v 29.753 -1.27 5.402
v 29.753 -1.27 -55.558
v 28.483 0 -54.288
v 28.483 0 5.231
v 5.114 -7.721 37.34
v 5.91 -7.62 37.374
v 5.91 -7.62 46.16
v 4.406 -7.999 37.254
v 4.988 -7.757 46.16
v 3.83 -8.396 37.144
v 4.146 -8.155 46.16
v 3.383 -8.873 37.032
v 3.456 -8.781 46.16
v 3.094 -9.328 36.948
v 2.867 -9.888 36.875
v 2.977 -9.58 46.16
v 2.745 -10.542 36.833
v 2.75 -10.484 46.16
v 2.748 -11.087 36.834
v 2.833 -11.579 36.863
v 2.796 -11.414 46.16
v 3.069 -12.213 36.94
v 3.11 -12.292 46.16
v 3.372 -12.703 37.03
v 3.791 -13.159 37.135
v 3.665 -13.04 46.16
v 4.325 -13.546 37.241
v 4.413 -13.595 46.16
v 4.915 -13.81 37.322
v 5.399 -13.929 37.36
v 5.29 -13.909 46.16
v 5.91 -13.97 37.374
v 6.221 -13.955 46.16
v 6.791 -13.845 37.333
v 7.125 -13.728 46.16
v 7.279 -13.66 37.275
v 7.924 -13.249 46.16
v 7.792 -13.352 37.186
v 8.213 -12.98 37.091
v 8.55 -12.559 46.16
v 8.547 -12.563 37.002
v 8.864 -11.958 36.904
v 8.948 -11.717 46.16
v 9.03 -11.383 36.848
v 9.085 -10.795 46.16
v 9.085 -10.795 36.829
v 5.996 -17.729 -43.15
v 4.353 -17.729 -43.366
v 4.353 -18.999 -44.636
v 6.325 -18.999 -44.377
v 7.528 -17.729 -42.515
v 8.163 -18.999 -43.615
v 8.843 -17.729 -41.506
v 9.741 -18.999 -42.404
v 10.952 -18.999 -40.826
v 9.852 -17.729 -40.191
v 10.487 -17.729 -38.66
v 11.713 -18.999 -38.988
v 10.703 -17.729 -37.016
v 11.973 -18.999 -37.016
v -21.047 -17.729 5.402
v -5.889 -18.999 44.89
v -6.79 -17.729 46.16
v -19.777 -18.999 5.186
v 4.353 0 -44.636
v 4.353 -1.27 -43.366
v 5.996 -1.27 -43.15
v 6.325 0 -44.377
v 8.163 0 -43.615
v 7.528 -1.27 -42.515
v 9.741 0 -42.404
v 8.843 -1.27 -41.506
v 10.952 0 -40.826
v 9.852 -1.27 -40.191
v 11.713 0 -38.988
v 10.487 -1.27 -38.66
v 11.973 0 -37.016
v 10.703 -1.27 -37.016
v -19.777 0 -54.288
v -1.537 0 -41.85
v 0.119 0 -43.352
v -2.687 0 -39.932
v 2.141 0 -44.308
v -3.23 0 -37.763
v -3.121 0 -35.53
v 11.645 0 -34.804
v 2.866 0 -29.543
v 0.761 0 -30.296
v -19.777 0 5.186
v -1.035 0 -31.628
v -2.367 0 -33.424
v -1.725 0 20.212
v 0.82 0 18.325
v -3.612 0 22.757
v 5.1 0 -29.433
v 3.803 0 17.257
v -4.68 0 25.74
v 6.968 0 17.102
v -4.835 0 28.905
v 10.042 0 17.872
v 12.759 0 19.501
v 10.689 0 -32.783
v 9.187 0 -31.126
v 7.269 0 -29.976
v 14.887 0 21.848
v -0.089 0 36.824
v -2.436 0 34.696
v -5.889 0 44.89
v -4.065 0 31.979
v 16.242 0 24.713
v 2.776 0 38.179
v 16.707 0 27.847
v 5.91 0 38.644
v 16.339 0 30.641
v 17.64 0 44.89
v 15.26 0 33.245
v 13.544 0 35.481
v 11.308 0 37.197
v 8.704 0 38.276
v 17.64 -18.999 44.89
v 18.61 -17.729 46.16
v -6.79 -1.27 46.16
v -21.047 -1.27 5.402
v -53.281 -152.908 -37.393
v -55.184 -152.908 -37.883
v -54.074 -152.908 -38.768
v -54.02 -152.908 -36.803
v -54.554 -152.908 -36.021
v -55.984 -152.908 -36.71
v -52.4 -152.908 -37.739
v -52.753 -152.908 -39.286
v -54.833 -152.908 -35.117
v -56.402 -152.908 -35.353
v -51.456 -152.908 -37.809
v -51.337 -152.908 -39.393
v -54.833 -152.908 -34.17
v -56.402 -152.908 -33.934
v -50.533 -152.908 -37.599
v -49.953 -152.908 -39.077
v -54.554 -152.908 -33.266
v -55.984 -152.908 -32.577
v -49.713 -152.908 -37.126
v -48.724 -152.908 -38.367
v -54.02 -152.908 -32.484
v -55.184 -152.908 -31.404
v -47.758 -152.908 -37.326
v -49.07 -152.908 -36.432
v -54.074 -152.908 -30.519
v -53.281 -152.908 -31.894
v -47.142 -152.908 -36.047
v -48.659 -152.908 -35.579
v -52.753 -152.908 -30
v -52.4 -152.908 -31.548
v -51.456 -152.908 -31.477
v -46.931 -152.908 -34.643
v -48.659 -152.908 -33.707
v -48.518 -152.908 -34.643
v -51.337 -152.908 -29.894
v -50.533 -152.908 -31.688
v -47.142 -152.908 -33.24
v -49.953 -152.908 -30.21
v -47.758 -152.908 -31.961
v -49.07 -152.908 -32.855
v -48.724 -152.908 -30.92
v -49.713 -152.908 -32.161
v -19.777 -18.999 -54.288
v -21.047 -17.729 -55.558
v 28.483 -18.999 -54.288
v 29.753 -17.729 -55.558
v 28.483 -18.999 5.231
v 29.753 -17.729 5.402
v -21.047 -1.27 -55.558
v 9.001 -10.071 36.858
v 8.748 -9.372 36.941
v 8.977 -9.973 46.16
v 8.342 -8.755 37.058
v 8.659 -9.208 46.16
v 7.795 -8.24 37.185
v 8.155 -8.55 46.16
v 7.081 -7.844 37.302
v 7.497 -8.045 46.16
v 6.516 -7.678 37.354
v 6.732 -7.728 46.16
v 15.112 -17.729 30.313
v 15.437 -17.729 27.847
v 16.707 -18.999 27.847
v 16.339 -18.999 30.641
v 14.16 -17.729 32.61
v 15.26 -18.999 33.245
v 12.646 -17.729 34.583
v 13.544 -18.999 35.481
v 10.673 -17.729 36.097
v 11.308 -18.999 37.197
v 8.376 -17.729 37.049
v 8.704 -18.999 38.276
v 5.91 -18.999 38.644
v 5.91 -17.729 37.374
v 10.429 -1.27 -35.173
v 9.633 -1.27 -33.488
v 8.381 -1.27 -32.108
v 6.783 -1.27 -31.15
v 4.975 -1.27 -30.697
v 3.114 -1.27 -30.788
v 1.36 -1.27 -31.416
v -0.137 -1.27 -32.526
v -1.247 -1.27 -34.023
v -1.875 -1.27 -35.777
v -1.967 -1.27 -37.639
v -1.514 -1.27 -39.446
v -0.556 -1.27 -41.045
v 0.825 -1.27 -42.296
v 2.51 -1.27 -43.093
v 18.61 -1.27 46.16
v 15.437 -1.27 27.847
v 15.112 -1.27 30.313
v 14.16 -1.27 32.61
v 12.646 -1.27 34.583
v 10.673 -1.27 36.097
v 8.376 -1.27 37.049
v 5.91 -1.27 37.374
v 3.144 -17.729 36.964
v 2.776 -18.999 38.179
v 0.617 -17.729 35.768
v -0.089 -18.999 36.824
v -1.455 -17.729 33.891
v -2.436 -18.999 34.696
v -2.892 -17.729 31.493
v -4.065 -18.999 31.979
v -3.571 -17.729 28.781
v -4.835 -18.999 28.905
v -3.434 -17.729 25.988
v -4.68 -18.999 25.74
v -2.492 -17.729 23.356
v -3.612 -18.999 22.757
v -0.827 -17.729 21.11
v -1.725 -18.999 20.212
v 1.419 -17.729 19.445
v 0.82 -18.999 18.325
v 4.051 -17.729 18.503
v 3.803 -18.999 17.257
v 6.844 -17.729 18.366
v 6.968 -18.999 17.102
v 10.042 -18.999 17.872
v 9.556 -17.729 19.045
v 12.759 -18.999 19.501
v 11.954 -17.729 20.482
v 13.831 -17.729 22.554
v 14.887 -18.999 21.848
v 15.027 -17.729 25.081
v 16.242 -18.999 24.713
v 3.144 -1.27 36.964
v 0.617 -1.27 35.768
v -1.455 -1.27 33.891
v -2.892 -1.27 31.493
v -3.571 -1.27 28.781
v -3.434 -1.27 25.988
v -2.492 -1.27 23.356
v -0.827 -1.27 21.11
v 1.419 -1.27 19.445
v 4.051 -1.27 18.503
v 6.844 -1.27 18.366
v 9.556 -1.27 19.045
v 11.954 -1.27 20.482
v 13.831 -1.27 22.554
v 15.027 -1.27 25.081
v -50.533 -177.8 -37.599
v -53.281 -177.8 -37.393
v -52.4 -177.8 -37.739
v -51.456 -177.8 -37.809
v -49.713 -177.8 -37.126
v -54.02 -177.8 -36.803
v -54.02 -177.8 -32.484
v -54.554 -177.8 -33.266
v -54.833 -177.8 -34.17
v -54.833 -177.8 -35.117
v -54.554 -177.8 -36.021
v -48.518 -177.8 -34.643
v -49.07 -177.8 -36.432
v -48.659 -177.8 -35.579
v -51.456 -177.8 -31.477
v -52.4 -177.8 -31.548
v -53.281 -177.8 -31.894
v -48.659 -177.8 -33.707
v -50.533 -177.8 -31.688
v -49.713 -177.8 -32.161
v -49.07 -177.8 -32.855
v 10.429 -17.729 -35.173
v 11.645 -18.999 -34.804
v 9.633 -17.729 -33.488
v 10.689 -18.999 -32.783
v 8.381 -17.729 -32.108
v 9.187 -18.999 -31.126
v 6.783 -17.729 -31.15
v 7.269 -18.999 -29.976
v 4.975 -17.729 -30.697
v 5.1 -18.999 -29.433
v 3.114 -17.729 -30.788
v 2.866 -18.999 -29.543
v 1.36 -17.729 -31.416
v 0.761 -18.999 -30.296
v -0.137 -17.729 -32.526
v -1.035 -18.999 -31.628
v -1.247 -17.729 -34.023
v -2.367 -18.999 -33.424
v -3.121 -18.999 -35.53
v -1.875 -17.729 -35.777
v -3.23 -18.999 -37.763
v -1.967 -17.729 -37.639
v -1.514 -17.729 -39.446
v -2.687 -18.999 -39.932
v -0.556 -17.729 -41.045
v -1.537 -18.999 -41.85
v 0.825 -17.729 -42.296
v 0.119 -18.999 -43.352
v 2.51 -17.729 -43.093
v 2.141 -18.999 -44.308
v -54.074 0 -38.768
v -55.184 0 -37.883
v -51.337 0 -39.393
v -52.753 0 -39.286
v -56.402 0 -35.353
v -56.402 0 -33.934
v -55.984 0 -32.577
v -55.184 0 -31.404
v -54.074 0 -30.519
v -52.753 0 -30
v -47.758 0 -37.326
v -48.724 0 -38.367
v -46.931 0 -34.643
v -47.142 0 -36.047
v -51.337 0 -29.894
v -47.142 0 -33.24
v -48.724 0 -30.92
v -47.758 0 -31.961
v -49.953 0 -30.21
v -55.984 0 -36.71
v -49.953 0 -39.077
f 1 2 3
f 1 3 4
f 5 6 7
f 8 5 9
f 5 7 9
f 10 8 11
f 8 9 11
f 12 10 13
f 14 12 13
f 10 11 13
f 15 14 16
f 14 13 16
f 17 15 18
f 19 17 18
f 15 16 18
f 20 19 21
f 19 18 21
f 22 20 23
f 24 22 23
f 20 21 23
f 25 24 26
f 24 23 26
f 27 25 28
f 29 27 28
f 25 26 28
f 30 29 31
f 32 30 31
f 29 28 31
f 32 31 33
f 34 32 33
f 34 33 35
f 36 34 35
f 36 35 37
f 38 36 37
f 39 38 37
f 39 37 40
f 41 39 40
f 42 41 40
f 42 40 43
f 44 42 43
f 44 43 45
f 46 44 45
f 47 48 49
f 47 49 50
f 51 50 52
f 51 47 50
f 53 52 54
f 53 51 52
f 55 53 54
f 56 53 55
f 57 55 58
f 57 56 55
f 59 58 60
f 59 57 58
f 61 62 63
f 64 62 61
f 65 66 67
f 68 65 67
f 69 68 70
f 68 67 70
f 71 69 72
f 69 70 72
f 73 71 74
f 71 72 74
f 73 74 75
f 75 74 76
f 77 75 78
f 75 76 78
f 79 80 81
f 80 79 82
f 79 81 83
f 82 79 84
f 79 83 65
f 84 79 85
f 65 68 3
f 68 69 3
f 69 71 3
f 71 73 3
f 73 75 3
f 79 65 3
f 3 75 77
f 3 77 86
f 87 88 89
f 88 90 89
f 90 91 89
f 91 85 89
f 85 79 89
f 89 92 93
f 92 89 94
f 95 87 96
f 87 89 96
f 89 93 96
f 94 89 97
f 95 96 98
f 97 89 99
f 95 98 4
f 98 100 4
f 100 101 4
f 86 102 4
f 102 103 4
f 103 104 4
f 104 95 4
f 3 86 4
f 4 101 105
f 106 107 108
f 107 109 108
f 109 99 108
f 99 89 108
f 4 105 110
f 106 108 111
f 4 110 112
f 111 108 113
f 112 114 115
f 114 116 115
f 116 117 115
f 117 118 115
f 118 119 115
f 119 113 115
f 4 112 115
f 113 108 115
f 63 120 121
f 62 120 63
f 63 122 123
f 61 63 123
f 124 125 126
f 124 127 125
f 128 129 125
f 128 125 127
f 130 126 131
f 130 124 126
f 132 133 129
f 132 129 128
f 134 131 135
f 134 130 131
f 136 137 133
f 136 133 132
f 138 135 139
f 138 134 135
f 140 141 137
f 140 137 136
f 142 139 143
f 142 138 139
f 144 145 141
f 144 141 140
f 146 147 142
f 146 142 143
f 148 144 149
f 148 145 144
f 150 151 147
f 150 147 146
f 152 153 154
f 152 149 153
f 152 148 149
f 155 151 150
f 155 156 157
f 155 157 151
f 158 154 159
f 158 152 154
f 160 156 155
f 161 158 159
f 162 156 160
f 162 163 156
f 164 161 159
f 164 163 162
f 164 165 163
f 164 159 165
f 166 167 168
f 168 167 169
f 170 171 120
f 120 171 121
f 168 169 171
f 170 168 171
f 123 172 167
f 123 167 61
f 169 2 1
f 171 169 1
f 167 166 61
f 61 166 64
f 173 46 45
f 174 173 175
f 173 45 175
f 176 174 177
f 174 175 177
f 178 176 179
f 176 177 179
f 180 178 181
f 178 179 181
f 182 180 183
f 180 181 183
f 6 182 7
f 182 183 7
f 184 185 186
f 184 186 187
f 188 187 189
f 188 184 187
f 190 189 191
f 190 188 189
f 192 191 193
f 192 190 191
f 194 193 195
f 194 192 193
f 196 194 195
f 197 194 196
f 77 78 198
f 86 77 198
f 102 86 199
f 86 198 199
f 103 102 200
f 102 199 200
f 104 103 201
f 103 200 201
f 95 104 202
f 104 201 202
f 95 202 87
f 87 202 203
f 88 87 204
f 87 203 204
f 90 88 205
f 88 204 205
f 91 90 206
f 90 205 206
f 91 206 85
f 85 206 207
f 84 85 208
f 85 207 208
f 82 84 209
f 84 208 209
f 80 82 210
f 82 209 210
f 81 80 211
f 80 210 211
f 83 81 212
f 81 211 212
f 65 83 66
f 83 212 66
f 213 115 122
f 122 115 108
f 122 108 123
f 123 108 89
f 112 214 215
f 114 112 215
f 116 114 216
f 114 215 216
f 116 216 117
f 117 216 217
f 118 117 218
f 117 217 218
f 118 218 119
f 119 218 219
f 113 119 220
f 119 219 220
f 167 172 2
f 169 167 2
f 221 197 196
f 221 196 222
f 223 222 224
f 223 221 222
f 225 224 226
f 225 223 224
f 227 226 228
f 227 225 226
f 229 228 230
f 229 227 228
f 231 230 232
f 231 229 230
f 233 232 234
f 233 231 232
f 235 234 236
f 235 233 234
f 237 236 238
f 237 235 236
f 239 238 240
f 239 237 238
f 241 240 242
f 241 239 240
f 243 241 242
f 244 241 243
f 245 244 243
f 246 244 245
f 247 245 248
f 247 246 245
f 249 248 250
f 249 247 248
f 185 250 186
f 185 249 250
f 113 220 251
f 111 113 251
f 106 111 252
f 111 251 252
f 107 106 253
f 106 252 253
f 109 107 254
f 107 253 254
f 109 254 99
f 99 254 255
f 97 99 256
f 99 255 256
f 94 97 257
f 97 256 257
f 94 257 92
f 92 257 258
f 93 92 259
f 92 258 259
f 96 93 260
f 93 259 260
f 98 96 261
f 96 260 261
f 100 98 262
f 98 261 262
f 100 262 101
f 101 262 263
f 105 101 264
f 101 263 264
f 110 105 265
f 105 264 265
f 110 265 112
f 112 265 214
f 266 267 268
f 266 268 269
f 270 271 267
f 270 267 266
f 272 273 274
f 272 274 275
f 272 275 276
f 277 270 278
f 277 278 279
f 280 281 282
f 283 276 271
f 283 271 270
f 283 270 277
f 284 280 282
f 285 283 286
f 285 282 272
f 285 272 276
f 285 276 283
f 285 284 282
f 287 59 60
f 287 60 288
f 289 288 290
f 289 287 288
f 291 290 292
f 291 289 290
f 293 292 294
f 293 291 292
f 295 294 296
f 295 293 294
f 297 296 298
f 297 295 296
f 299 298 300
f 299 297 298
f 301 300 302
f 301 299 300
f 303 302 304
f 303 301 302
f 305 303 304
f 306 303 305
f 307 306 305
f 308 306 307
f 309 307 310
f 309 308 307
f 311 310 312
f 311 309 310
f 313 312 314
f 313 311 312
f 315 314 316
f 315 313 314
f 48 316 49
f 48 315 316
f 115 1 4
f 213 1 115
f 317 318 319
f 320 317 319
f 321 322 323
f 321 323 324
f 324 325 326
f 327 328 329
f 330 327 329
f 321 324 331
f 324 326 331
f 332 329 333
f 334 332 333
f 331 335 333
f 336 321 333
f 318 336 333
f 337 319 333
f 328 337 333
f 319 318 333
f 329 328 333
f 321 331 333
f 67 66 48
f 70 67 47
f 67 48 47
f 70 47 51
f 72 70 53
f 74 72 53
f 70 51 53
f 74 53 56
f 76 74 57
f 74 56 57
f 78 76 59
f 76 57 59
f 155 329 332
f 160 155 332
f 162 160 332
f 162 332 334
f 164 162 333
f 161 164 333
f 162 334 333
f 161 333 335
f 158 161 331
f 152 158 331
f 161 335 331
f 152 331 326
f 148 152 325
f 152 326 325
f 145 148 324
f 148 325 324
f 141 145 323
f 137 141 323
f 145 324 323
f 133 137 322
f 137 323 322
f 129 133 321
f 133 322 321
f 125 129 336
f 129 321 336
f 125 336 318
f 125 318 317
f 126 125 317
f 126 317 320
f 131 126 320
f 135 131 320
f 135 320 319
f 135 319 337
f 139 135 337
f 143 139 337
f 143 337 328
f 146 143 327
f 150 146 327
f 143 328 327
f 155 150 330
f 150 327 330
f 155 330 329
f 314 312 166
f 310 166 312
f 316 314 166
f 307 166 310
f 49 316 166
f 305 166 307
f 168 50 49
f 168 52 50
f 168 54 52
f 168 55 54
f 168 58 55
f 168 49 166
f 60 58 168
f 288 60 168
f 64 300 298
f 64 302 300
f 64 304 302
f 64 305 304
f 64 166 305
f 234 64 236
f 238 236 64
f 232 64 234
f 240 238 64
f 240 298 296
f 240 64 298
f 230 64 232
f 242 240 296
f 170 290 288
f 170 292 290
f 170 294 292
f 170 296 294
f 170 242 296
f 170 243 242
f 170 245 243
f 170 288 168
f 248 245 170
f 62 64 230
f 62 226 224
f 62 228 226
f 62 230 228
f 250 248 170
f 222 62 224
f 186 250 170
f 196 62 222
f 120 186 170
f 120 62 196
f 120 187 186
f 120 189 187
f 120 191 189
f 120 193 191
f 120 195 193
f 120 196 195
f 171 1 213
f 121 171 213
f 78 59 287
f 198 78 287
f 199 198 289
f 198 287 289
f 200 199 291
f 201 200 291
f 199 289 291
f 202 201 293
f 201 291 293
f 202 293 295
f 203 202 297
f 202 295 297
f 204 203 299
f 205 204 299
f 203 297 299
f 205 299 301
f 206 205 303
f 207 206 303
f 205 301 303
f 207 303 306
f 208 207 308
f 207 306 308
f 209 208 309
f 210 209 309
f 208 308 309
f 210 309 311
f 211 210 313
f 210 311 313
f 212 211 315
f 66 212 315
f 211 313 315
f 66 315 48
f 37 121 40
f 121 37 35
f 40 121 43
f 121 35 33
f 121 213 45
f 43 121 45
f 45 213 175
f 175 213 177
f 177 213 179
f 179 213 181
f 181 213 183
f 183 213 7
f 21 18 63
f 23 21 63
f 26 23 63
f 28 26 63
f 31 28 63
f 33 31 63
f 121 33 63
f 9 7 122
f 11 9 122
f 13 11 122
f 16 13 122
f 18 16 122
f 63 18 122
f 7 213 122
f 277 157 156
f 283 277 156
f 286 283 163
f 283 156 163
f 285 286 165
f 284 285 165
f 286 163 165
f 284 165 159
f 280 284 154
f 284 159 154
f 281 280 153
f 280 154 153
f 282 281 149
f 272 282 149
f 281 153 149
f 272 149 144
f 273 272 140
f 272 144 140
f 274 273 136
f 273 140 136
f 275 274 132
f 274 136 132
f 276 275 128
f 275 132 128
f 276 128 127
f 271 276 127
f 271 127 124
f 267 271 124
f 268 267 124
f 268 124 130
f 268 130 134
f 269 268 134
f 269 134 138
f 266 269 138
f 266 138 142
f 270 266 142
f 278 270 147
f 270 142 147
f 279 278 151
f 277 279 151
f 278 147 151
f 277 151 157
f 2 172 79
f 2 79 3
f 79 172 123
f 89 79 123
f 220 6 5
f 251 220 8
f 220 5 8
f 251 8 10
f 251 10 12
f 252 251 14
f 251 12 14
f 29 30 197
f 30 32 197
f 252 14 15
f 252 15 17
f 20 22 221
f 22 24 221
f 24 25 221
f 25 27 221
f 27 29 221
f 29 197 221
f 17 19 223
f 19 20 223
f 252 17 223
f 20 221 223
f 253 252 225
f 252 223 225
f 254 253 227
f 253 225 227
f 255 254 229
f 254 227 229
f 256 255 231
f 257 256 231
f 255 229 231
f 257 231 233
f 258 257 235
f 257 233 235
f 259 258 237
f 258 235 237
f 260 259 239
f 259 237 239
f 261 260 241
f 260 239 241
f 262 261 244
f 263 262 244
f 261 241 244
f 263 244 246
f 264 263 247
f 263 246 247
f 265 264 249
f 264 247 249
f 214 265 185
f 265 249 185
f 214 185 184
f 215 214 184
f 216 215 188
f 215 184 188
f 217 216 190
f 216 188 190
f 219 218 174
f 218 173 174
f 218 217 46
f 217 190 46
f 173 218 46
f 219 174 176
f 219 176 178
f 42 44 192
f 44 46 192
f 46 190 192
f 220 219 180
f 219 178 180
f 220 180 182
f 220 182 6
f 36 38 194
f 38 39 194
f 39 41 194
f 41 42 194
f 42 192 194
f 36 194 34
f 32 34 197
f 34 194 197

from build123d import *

# Parameters (mm, degrees)
F0_W      = 50.8
F0_H      = 60.96
F1_DEPTH  = 18.9992
F3_DEPTH  = 25.4
F5_DEPTH  = 25.4
F6_SIZE   = 1.27
F7_SIZE   = 1.27
F9_DEPTH  = 25.4
F10_R     = 4.7625
F11_DEPTH = 152.908
F12_R     = 3.175
F13_DEPTH = 24.892


with BuildPart() as f1:
    # F0 (on Front) → F1 (new body)
    with BuildSketch(Plane.XZ):
        Polygon((-6.790147, 46.160248), (-21.047119, 5.401799), (29.752881, 5.401799), (18.609853, 46.160248), align=None)
        with Locations((4.352881, -25.078201)):
            Rectangle(F0_W, F0_H)
    extrude(amount=F1_DEPTH)

    # F2 (on face) → F3 (cut)
    with BuildSketch(Plane.XZ.offset(18.9992)):
        with BuildLine():
            ThreePointArc((15.436803, 27.846848), (12.646424, 34.583419), (5.909853, 37.373798))
            ThreePointArc((5.909853, 37.373798), (-0.826718, 21.110277), (15.436803, 27.846848))
        make_face()
    extrude(amount=-F3_DEPTH, mode=Mode.SUBTRACT)

    # F4 (on face) → F5 (cut)
    with BuildSketch(Plane.XZ.offset(18.9992)):
        with BuildLine():
            ThreePointArc((10.702881, -37.016201), (-0.137247, -32.526073), (4.352881, -43.366201))
            ThreePointArc((4.352881, -43.366201), (8.843009, -41.506329), (10.702881, -37.016201))
        make_face()
    extrude(amount=-F5_DEPTH, mode=Mode.SUBTRACT)

    # F6
    f6_edges = [f1.edges().sort_by_distance(p)[0] for p in [
        (24.181367, -18.9992, 25.781023),
        (5.909853, -18.9992, 46.160248),
        (-13.918633, -18.9992, 25.781023),
        (-21.047119, -18.9992, -25.078201),
        (4.352881, -18.9992, -55.558201),
        (29.752881, -18.9992, -25.078201),
        (4.352881, -18.9992, -30.666201),
        (-3.617097, -18.9992, 27.846848),
    ]]
    chamfer(f6_edges, length=F6_SIZE)

    # F7
    f7_edges = [f1.edges().sort_by_distance(p)[0] for p in [
        (5.909853, 0, 46.160248),
        (-13.918633, 0, 25.781023),
        (-21.047119, 0, -25.078201),
        (4.352881, 0, -55.558201),
        (29.752881, 0, -25.078201),
        (24.181367, 0, 25.781023),
        (-3.617097, 0, 27.846848),
        (4.352881, 0, -30.666201),
    ]]
    chamfer(f7_edges, length=F7_SIZE)

    # F8 (on face) → F9 (cut)
    with BuildSketch(Plane.XY.offset(46.160248)):
        with BuildLine():
            ThreePointArc((9.084853, -10.795), (8.154917, -8.549936), (5.909853, -7.62))
            ThreePointArc((5.909853, -7.62), (3.664789, -13.040064), (9.084853, -10.795))
        make_face()
    extrude(amount=-F9_DEPTH, mode=Mode.SUBTRACT)


with BuildPart() as f11:
    # F10 (on Front) → F11 (new body)
    with BuildSketch(Plane.XZ):
        with Locations((-51.693011, -34.64333)):
            Circle(F10_R)
    extrude(amount=F11_DEPTH)

    # F12 (on face) → F13 (join)
    with BuildSketch(Plane.XZ.offset(152.908)):
        with Locations((-51.693011, -34.64333)):
            Circle(F12_R)
    extrude(amount=F13_DEPTH)


solid = Compound([f1.part, f11.part])
